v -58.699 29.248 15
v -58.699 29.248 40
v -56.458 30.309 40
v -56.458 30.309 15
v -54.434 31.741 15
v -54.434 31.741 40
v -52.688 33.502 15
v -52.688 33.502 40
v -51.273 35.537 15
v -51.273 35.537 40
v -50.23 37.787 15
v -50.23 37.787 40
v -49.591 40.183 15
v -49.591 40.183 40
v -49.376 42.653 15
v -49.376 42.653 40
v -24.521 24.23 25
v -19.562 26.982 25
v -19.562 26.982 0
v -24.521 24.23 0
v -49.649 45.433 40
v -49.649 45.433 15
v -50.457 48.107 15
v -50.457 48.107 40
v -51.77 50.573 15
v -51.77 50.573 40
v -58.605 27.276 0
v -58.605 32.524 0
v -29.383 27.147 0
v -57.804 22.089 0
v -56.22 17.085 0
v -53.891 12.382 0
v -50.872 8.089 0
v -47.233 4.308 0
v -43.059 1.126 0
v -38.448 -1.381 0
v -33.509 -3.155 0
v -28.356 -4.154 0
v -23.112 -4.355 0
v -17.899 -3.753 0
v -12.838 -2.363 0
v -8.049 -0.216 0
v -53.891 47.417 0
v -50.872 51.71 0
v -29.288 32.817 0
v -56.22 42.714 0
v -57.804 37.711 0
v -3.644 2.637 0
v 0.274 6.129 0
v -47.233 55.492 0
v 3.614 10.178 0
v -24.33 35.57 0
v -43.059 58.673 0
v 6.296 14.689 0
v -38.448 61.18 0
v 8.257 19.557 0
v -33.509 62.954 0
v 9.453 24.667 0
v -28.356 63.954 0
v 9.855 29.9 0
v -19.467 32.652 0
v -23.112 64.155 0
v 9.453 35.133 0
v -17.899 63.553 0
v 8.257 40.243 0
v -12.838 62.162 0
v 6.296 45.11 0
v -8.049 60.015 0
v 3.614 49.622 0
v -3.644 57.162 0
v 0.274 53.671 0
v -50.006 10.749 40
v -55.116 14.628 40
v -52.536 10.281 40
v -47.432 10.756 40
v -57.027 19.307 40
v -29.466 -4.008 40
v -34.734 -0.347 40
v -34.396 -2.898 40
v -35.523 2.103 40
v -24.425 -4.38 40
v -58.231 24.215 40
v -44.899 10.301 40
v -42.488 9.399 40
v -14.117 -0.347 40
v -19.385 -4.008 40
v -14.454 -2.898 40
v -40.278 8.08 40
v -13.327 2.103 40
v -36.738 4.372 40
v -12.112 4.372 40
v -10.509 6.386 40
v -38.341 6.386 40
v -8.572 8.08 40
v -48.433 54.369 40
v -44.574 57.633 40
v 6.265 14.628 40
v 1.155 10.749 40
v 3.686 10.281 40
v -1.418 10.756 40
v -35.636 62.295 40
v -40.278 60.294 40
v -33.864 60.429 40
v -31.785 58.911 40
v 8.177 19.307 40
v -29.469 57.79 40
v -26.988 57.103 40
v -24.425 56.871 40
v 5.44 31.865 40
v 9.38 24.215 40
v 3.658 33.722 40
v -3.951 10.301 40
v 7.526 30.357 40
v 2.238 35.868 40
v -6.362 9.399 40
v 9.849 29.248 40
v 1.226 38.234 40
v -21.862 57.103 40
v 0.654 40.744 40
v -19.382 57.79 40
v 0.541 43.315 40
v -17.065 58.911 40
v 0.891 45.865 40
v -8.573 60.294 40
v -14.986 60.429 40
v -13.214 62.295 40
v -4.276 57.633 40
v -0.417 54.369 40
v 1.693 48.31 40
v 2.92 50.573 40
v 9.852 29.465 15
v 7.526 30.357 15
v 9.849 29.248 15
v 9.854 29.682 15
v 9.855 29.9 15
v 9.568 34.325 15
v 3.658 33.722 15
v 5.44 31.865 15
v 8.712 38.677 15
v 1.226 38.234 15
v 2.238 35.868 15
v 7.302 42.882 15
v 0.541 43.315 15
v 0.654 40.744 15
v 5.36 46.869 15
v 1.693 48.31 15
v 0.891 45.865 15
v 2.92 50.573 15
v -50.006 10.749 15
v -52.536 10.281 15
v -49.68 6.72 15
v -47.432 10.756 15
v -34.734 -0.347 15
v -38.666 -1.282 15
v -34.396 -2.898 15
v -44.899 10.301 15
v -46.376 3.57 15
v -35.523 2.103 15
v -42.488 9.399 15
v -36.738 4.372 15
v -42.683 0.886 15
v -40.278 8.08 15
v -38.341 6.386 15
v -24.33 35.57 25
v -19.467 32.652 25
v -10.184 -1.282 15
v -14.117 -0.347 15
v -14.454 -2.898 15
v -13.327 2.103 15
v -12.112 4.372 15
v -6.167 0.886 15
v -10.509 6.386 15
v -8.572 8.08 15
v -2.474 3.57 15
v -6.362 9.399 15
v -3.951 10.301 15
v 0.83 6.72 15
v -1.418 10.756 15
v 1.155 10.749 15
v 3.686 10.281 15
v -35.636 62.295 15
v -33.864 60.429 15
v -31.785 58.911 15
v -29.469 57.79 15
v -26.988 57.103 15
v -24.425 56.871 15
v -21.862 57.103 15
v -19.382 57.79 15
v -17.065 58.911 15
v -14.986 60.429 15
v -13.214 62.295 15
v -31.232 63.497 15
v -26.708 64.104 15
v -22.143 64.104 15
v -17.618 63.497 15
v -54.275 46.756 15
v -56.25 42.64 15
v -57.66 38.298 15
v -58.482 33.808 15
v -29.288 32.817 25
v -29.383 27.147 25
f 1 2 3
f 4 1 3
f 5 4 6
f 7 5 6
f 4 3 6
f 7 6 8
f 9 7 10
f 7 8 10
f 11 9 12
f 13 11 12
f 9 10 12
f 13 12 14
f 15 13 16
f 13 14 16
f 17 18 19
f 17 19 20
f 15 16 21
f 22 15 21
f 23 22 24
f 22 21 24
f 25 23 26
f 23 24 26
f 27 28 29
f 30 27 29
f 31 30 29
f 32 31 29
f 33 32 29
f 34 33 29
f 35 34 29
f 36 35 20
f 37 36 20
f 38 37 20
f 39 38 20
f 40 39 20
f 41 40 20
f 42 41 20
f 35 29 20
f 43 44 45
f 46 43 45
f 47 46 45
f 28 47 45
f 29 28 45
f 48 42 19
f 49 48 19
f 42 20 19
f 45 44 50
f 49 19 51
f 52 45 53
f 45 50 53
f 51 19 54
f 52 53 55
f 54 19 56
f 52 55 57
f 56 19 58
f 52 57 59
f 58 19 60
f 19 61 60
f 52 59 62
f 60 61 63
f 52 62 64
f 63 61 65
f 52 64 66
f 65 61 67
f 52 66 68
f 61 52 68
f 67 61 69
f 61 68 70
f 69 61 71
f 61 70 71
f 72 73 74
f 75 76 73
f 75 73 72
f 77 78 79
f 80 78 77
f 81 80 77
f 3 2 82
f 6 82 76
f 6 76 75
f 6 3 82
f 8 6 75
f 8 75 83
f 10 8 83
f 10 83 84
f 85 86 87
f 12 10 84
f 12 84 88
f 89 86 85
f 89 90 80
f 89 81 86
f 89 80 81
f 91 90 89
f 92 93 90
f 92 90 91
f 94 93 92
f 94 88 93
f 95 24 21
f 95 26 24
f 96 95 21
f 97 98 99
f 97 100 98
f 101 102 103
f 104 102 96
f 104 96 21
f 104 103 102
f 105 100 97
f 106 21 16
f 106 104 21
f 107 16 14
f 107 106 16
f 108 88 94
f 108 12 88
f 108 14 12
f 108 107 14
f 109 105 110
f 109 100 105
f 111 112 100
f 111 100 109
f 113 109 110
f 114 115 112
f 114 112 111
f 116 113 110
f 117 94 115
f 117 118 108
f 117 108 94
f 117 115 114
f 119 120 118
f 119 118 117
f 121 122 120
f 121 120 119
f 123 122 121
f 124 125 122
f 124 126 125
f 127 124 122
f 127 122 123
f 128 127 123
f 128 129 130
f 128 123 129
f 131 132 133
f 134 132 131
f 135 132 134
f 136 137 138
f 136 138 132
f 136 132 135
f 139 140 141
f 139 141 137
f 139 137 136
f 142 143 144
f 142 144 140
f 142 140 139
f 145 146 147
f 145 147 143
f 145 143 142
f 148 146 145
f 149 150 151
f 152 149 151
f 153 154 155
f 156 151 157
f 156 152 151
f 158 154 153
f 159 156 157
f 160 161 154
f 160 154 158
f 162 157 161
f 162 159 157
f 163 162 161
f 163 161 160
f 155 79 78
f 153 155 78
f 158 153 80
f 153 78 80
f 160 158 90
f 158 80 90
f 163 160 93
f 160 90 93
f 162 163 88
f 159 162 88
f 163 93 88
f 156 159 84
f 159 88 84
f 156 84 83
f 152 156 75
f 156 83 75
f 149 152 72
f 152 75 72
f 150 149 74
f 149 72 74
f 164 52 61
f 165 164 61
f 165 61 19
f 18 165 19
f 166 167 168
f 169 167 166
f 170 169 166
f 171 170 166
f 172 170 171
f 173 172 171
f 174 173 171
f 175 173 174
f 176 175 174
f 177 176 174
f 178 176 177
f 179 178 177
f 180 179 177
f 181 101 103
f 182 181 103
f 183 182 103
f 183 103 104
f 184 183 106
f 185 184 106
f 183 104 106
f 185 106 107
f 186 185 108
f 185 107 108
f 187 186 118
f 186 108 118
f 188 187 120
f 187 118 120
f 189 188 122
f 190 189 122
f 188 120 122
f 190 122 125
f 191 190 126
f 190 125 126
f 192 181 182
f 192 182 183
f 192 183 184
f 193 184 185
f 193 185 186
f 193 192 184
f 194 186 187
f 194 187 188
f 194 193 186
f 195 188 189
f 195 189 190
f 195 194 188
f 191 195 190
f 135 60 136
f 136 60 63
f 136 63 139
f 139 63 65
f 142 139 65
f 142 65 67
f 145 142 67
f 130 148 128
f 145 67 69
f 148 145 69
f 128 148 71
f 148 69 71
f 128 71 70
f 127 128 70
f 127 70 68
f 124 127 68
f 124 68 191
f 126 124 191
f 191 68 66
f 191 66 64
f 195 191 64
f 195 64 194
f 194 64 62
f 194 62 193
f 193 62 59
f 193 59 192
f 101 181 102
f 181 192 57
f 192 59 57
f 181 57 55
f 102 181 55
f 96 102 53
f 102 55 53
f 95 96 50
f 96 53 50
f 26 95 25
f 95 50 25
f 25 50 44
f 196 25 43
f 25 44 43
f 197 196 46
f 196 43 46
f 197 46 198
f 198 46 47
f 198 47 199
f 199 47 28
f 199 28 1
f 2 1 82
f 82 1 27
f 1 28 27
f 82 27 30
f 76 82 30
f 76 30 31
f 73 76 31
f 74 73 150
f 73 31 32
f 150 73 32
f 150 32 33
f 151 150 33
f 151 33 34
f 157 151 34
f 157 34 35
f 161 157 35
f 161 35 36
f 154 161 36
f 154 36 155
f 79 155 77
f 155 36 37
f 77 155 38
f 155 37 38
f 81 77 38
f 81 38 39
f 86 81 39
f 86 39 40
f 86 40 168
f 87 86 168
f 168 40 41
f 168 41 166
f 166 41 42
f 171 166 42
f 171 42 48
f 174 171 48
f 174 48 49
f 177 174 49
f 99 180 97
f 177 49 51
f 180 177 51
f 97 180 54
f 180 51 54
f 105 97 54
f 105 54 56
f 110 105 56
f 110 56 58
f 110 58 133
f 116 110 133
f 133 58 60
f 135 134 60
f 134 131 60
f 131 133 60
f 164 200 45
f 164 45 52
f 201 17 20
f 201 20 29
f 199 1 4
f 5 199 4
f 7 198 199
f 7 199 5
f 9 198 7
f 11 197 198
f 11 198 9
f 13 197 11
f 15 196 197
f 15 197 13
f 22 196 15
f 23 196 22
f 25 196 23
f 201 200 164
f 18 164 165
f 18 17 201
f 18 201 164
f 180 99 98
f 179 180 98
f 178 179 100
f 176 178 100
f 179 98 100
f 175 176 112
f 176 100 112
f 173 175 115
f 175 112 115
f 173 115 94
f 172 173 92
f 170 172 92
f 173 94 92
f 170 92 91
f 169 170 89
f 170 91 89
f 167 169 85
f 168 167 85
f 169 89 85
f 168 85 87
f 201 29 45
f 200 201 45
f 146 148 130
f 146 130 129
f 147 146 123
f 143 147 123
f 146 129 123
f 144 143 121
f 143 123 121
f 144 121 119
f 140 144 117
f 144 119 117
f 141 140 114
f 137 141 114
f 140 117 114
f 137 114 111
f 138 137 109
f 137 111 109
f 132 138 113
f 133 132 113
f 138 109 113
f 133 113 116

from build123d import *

# Parameters (mm, degrees)
F0_R     = 34.280091
F1_DEPTH = 40
F3_DEPTH = 25
F5_DEPTH = 25


with BuildPart() as f1:
    # F0 (on Top) → F1 (new body)
    with BuildSketch(Plane.XY):
        with Locations((-24.425134, 29.899733)):
            Circle(F0_R)
    extrude(amount=F1_DEPTH)

    # F2 (on face) → F3 (cut)
    with BuildSketch(Plane.XY.offset(40)):
        with BuildLine():
            ThreePointArc((-13.213922, 62.294692), (-24.425134, 64.179824), (-35.636346, 62.294692))
            ThreePointArc((-35.636346, 62.294692), (-24.425134, 56.870885), (-13.213922, 62.294692))
        make_face()
        with BuildLine():
            ThreePointArc((-13.213922, 62.294692), (-10.920198, 66.471352), (-10.126233, 71.169786))
            ThreePointArc((-10.126233, 71.169786), (-29.123568, 84.674722), (-35.636346, 62.294692))
            ThreePointArc((-35.636346, 62.294692), (-24.425134, 64.179824), (-13.213922, 62.294692))
        make_face()
        with BuildLine():
            ThreePointArc((9.854957, 29.899733), (8.074967, 40.802397), (2.919848, 50.572822))
            ThreePointArc((2.919848, 50.572822), (1.225956, 38.234277), (9.848758, 29.24783))
            ThreePointArc((9.848758, 29.24783), (9.853407, 29.573767), (9.854957, 29.899733))
        make_face()
        with BuildLine():
            ThreePointArc((29.12392, 42.652881), (18.961908, 56.340274), (2.919848, 50.572822))
            ThreePointArc((2.919848, 50.572822), (8.074967, 40.802397), (9.854957, 29.899733))
            ThreePointArc((9.854957, 29.899733), (9.853407, 29.573767), (9.848758, 29.24783))
            ThreePointArc((9.848758, 29.24783), (22.989071, 30.913766), (29.12392, 42.652881))
        make_face()
        with BuildLine():
            ThreePointArc((14.131696, -3.488441), (11.224856, 5.15329), (3.686206, 10.281446))
            ThreePointArc((3.686206, 10.281446), (-4.275802, 2.166557), (-14.453916, -2.898124))
            ThreePointArc((-14.453916, -2.898124), (-0.462427, -17.784294), (14.131696, -3.488441))
        make_face()
        with BuildLine():
            ThreePointArc((-14.453916, -2.898124), (-4.275802, 2.166557), (3.686206, 10.281446))
            ThreePointArc((3.686206, 10.281446), (-8.571889, 8.079613), (-14.453916, -2.898124))
        make_face()
        with BuildLine():
            ThreePointArc((-34.396352, -2.898124), (-40.278379, 8.079613), (-52.536474, 10.281446))
            ThreePointArc((-52.536474, 10.281446), (-44.574466, 2.166557), (-34.396352, -2.898124))
        make_face()
        with BuildLine():
            ThreePointArc((-34.396352, -2.898124), (-44.574466, 2.166557), (-52.536474, 10.281446))
            ThreePointArc((-52.536474, 10.281446), (-57.324793, -14.880502), (-34.384161, -3.488441))
            ThreePointArc((-34.384161, -3.488441), (-34.387209, -3.19322), (-34.396352, -2.898124))
        make_face()
        with BuildLine():
            ThreePointArc((-58.699026, 29.24783), (-57.027438, 40.492864), (-51.770116, 50.572822))
            ThreePointArc((-51.770116, 50.572822), (-77.27435, 47.071485), (-58.699026, 29.24783))
        make_face()
        with BuildLine():
            ThreePointArc((-49.376386, 42.652881), (-49.987894, 46.78977), (-51.770116, 50.572822))
            ThreePointArc((-51.770116, 50.572822), (-57.027438, 40.492864), (-58.699026, 29.24783))
            ThreePointArc((-58.699026, 29.24783), (-51.936172, 34.488828), (-49.376386, 42.652881))
        make_face()
    extrude(amount=-F3_DEPTH, mode=Mode.SUBTRACT)

    # F4 (on face) → F5 (cut)
    with BuildSketch(Plane(origin=(0, 0, 0), x_dir=(1, 0, 0), z_dir=(0, 0, -1))):
        Polygon((-24.329751, -35.569776), (-19.467041, -32.652151), (-19.562424, -26.982108), (-24.520517, -24.22969), (-29.383227, -27.147316), (-29.287844, -32.817359), align=None)
    extrude(amount=-F5_DEPTH, mode=Mode.SUBTRACT)


solid = f1.part
